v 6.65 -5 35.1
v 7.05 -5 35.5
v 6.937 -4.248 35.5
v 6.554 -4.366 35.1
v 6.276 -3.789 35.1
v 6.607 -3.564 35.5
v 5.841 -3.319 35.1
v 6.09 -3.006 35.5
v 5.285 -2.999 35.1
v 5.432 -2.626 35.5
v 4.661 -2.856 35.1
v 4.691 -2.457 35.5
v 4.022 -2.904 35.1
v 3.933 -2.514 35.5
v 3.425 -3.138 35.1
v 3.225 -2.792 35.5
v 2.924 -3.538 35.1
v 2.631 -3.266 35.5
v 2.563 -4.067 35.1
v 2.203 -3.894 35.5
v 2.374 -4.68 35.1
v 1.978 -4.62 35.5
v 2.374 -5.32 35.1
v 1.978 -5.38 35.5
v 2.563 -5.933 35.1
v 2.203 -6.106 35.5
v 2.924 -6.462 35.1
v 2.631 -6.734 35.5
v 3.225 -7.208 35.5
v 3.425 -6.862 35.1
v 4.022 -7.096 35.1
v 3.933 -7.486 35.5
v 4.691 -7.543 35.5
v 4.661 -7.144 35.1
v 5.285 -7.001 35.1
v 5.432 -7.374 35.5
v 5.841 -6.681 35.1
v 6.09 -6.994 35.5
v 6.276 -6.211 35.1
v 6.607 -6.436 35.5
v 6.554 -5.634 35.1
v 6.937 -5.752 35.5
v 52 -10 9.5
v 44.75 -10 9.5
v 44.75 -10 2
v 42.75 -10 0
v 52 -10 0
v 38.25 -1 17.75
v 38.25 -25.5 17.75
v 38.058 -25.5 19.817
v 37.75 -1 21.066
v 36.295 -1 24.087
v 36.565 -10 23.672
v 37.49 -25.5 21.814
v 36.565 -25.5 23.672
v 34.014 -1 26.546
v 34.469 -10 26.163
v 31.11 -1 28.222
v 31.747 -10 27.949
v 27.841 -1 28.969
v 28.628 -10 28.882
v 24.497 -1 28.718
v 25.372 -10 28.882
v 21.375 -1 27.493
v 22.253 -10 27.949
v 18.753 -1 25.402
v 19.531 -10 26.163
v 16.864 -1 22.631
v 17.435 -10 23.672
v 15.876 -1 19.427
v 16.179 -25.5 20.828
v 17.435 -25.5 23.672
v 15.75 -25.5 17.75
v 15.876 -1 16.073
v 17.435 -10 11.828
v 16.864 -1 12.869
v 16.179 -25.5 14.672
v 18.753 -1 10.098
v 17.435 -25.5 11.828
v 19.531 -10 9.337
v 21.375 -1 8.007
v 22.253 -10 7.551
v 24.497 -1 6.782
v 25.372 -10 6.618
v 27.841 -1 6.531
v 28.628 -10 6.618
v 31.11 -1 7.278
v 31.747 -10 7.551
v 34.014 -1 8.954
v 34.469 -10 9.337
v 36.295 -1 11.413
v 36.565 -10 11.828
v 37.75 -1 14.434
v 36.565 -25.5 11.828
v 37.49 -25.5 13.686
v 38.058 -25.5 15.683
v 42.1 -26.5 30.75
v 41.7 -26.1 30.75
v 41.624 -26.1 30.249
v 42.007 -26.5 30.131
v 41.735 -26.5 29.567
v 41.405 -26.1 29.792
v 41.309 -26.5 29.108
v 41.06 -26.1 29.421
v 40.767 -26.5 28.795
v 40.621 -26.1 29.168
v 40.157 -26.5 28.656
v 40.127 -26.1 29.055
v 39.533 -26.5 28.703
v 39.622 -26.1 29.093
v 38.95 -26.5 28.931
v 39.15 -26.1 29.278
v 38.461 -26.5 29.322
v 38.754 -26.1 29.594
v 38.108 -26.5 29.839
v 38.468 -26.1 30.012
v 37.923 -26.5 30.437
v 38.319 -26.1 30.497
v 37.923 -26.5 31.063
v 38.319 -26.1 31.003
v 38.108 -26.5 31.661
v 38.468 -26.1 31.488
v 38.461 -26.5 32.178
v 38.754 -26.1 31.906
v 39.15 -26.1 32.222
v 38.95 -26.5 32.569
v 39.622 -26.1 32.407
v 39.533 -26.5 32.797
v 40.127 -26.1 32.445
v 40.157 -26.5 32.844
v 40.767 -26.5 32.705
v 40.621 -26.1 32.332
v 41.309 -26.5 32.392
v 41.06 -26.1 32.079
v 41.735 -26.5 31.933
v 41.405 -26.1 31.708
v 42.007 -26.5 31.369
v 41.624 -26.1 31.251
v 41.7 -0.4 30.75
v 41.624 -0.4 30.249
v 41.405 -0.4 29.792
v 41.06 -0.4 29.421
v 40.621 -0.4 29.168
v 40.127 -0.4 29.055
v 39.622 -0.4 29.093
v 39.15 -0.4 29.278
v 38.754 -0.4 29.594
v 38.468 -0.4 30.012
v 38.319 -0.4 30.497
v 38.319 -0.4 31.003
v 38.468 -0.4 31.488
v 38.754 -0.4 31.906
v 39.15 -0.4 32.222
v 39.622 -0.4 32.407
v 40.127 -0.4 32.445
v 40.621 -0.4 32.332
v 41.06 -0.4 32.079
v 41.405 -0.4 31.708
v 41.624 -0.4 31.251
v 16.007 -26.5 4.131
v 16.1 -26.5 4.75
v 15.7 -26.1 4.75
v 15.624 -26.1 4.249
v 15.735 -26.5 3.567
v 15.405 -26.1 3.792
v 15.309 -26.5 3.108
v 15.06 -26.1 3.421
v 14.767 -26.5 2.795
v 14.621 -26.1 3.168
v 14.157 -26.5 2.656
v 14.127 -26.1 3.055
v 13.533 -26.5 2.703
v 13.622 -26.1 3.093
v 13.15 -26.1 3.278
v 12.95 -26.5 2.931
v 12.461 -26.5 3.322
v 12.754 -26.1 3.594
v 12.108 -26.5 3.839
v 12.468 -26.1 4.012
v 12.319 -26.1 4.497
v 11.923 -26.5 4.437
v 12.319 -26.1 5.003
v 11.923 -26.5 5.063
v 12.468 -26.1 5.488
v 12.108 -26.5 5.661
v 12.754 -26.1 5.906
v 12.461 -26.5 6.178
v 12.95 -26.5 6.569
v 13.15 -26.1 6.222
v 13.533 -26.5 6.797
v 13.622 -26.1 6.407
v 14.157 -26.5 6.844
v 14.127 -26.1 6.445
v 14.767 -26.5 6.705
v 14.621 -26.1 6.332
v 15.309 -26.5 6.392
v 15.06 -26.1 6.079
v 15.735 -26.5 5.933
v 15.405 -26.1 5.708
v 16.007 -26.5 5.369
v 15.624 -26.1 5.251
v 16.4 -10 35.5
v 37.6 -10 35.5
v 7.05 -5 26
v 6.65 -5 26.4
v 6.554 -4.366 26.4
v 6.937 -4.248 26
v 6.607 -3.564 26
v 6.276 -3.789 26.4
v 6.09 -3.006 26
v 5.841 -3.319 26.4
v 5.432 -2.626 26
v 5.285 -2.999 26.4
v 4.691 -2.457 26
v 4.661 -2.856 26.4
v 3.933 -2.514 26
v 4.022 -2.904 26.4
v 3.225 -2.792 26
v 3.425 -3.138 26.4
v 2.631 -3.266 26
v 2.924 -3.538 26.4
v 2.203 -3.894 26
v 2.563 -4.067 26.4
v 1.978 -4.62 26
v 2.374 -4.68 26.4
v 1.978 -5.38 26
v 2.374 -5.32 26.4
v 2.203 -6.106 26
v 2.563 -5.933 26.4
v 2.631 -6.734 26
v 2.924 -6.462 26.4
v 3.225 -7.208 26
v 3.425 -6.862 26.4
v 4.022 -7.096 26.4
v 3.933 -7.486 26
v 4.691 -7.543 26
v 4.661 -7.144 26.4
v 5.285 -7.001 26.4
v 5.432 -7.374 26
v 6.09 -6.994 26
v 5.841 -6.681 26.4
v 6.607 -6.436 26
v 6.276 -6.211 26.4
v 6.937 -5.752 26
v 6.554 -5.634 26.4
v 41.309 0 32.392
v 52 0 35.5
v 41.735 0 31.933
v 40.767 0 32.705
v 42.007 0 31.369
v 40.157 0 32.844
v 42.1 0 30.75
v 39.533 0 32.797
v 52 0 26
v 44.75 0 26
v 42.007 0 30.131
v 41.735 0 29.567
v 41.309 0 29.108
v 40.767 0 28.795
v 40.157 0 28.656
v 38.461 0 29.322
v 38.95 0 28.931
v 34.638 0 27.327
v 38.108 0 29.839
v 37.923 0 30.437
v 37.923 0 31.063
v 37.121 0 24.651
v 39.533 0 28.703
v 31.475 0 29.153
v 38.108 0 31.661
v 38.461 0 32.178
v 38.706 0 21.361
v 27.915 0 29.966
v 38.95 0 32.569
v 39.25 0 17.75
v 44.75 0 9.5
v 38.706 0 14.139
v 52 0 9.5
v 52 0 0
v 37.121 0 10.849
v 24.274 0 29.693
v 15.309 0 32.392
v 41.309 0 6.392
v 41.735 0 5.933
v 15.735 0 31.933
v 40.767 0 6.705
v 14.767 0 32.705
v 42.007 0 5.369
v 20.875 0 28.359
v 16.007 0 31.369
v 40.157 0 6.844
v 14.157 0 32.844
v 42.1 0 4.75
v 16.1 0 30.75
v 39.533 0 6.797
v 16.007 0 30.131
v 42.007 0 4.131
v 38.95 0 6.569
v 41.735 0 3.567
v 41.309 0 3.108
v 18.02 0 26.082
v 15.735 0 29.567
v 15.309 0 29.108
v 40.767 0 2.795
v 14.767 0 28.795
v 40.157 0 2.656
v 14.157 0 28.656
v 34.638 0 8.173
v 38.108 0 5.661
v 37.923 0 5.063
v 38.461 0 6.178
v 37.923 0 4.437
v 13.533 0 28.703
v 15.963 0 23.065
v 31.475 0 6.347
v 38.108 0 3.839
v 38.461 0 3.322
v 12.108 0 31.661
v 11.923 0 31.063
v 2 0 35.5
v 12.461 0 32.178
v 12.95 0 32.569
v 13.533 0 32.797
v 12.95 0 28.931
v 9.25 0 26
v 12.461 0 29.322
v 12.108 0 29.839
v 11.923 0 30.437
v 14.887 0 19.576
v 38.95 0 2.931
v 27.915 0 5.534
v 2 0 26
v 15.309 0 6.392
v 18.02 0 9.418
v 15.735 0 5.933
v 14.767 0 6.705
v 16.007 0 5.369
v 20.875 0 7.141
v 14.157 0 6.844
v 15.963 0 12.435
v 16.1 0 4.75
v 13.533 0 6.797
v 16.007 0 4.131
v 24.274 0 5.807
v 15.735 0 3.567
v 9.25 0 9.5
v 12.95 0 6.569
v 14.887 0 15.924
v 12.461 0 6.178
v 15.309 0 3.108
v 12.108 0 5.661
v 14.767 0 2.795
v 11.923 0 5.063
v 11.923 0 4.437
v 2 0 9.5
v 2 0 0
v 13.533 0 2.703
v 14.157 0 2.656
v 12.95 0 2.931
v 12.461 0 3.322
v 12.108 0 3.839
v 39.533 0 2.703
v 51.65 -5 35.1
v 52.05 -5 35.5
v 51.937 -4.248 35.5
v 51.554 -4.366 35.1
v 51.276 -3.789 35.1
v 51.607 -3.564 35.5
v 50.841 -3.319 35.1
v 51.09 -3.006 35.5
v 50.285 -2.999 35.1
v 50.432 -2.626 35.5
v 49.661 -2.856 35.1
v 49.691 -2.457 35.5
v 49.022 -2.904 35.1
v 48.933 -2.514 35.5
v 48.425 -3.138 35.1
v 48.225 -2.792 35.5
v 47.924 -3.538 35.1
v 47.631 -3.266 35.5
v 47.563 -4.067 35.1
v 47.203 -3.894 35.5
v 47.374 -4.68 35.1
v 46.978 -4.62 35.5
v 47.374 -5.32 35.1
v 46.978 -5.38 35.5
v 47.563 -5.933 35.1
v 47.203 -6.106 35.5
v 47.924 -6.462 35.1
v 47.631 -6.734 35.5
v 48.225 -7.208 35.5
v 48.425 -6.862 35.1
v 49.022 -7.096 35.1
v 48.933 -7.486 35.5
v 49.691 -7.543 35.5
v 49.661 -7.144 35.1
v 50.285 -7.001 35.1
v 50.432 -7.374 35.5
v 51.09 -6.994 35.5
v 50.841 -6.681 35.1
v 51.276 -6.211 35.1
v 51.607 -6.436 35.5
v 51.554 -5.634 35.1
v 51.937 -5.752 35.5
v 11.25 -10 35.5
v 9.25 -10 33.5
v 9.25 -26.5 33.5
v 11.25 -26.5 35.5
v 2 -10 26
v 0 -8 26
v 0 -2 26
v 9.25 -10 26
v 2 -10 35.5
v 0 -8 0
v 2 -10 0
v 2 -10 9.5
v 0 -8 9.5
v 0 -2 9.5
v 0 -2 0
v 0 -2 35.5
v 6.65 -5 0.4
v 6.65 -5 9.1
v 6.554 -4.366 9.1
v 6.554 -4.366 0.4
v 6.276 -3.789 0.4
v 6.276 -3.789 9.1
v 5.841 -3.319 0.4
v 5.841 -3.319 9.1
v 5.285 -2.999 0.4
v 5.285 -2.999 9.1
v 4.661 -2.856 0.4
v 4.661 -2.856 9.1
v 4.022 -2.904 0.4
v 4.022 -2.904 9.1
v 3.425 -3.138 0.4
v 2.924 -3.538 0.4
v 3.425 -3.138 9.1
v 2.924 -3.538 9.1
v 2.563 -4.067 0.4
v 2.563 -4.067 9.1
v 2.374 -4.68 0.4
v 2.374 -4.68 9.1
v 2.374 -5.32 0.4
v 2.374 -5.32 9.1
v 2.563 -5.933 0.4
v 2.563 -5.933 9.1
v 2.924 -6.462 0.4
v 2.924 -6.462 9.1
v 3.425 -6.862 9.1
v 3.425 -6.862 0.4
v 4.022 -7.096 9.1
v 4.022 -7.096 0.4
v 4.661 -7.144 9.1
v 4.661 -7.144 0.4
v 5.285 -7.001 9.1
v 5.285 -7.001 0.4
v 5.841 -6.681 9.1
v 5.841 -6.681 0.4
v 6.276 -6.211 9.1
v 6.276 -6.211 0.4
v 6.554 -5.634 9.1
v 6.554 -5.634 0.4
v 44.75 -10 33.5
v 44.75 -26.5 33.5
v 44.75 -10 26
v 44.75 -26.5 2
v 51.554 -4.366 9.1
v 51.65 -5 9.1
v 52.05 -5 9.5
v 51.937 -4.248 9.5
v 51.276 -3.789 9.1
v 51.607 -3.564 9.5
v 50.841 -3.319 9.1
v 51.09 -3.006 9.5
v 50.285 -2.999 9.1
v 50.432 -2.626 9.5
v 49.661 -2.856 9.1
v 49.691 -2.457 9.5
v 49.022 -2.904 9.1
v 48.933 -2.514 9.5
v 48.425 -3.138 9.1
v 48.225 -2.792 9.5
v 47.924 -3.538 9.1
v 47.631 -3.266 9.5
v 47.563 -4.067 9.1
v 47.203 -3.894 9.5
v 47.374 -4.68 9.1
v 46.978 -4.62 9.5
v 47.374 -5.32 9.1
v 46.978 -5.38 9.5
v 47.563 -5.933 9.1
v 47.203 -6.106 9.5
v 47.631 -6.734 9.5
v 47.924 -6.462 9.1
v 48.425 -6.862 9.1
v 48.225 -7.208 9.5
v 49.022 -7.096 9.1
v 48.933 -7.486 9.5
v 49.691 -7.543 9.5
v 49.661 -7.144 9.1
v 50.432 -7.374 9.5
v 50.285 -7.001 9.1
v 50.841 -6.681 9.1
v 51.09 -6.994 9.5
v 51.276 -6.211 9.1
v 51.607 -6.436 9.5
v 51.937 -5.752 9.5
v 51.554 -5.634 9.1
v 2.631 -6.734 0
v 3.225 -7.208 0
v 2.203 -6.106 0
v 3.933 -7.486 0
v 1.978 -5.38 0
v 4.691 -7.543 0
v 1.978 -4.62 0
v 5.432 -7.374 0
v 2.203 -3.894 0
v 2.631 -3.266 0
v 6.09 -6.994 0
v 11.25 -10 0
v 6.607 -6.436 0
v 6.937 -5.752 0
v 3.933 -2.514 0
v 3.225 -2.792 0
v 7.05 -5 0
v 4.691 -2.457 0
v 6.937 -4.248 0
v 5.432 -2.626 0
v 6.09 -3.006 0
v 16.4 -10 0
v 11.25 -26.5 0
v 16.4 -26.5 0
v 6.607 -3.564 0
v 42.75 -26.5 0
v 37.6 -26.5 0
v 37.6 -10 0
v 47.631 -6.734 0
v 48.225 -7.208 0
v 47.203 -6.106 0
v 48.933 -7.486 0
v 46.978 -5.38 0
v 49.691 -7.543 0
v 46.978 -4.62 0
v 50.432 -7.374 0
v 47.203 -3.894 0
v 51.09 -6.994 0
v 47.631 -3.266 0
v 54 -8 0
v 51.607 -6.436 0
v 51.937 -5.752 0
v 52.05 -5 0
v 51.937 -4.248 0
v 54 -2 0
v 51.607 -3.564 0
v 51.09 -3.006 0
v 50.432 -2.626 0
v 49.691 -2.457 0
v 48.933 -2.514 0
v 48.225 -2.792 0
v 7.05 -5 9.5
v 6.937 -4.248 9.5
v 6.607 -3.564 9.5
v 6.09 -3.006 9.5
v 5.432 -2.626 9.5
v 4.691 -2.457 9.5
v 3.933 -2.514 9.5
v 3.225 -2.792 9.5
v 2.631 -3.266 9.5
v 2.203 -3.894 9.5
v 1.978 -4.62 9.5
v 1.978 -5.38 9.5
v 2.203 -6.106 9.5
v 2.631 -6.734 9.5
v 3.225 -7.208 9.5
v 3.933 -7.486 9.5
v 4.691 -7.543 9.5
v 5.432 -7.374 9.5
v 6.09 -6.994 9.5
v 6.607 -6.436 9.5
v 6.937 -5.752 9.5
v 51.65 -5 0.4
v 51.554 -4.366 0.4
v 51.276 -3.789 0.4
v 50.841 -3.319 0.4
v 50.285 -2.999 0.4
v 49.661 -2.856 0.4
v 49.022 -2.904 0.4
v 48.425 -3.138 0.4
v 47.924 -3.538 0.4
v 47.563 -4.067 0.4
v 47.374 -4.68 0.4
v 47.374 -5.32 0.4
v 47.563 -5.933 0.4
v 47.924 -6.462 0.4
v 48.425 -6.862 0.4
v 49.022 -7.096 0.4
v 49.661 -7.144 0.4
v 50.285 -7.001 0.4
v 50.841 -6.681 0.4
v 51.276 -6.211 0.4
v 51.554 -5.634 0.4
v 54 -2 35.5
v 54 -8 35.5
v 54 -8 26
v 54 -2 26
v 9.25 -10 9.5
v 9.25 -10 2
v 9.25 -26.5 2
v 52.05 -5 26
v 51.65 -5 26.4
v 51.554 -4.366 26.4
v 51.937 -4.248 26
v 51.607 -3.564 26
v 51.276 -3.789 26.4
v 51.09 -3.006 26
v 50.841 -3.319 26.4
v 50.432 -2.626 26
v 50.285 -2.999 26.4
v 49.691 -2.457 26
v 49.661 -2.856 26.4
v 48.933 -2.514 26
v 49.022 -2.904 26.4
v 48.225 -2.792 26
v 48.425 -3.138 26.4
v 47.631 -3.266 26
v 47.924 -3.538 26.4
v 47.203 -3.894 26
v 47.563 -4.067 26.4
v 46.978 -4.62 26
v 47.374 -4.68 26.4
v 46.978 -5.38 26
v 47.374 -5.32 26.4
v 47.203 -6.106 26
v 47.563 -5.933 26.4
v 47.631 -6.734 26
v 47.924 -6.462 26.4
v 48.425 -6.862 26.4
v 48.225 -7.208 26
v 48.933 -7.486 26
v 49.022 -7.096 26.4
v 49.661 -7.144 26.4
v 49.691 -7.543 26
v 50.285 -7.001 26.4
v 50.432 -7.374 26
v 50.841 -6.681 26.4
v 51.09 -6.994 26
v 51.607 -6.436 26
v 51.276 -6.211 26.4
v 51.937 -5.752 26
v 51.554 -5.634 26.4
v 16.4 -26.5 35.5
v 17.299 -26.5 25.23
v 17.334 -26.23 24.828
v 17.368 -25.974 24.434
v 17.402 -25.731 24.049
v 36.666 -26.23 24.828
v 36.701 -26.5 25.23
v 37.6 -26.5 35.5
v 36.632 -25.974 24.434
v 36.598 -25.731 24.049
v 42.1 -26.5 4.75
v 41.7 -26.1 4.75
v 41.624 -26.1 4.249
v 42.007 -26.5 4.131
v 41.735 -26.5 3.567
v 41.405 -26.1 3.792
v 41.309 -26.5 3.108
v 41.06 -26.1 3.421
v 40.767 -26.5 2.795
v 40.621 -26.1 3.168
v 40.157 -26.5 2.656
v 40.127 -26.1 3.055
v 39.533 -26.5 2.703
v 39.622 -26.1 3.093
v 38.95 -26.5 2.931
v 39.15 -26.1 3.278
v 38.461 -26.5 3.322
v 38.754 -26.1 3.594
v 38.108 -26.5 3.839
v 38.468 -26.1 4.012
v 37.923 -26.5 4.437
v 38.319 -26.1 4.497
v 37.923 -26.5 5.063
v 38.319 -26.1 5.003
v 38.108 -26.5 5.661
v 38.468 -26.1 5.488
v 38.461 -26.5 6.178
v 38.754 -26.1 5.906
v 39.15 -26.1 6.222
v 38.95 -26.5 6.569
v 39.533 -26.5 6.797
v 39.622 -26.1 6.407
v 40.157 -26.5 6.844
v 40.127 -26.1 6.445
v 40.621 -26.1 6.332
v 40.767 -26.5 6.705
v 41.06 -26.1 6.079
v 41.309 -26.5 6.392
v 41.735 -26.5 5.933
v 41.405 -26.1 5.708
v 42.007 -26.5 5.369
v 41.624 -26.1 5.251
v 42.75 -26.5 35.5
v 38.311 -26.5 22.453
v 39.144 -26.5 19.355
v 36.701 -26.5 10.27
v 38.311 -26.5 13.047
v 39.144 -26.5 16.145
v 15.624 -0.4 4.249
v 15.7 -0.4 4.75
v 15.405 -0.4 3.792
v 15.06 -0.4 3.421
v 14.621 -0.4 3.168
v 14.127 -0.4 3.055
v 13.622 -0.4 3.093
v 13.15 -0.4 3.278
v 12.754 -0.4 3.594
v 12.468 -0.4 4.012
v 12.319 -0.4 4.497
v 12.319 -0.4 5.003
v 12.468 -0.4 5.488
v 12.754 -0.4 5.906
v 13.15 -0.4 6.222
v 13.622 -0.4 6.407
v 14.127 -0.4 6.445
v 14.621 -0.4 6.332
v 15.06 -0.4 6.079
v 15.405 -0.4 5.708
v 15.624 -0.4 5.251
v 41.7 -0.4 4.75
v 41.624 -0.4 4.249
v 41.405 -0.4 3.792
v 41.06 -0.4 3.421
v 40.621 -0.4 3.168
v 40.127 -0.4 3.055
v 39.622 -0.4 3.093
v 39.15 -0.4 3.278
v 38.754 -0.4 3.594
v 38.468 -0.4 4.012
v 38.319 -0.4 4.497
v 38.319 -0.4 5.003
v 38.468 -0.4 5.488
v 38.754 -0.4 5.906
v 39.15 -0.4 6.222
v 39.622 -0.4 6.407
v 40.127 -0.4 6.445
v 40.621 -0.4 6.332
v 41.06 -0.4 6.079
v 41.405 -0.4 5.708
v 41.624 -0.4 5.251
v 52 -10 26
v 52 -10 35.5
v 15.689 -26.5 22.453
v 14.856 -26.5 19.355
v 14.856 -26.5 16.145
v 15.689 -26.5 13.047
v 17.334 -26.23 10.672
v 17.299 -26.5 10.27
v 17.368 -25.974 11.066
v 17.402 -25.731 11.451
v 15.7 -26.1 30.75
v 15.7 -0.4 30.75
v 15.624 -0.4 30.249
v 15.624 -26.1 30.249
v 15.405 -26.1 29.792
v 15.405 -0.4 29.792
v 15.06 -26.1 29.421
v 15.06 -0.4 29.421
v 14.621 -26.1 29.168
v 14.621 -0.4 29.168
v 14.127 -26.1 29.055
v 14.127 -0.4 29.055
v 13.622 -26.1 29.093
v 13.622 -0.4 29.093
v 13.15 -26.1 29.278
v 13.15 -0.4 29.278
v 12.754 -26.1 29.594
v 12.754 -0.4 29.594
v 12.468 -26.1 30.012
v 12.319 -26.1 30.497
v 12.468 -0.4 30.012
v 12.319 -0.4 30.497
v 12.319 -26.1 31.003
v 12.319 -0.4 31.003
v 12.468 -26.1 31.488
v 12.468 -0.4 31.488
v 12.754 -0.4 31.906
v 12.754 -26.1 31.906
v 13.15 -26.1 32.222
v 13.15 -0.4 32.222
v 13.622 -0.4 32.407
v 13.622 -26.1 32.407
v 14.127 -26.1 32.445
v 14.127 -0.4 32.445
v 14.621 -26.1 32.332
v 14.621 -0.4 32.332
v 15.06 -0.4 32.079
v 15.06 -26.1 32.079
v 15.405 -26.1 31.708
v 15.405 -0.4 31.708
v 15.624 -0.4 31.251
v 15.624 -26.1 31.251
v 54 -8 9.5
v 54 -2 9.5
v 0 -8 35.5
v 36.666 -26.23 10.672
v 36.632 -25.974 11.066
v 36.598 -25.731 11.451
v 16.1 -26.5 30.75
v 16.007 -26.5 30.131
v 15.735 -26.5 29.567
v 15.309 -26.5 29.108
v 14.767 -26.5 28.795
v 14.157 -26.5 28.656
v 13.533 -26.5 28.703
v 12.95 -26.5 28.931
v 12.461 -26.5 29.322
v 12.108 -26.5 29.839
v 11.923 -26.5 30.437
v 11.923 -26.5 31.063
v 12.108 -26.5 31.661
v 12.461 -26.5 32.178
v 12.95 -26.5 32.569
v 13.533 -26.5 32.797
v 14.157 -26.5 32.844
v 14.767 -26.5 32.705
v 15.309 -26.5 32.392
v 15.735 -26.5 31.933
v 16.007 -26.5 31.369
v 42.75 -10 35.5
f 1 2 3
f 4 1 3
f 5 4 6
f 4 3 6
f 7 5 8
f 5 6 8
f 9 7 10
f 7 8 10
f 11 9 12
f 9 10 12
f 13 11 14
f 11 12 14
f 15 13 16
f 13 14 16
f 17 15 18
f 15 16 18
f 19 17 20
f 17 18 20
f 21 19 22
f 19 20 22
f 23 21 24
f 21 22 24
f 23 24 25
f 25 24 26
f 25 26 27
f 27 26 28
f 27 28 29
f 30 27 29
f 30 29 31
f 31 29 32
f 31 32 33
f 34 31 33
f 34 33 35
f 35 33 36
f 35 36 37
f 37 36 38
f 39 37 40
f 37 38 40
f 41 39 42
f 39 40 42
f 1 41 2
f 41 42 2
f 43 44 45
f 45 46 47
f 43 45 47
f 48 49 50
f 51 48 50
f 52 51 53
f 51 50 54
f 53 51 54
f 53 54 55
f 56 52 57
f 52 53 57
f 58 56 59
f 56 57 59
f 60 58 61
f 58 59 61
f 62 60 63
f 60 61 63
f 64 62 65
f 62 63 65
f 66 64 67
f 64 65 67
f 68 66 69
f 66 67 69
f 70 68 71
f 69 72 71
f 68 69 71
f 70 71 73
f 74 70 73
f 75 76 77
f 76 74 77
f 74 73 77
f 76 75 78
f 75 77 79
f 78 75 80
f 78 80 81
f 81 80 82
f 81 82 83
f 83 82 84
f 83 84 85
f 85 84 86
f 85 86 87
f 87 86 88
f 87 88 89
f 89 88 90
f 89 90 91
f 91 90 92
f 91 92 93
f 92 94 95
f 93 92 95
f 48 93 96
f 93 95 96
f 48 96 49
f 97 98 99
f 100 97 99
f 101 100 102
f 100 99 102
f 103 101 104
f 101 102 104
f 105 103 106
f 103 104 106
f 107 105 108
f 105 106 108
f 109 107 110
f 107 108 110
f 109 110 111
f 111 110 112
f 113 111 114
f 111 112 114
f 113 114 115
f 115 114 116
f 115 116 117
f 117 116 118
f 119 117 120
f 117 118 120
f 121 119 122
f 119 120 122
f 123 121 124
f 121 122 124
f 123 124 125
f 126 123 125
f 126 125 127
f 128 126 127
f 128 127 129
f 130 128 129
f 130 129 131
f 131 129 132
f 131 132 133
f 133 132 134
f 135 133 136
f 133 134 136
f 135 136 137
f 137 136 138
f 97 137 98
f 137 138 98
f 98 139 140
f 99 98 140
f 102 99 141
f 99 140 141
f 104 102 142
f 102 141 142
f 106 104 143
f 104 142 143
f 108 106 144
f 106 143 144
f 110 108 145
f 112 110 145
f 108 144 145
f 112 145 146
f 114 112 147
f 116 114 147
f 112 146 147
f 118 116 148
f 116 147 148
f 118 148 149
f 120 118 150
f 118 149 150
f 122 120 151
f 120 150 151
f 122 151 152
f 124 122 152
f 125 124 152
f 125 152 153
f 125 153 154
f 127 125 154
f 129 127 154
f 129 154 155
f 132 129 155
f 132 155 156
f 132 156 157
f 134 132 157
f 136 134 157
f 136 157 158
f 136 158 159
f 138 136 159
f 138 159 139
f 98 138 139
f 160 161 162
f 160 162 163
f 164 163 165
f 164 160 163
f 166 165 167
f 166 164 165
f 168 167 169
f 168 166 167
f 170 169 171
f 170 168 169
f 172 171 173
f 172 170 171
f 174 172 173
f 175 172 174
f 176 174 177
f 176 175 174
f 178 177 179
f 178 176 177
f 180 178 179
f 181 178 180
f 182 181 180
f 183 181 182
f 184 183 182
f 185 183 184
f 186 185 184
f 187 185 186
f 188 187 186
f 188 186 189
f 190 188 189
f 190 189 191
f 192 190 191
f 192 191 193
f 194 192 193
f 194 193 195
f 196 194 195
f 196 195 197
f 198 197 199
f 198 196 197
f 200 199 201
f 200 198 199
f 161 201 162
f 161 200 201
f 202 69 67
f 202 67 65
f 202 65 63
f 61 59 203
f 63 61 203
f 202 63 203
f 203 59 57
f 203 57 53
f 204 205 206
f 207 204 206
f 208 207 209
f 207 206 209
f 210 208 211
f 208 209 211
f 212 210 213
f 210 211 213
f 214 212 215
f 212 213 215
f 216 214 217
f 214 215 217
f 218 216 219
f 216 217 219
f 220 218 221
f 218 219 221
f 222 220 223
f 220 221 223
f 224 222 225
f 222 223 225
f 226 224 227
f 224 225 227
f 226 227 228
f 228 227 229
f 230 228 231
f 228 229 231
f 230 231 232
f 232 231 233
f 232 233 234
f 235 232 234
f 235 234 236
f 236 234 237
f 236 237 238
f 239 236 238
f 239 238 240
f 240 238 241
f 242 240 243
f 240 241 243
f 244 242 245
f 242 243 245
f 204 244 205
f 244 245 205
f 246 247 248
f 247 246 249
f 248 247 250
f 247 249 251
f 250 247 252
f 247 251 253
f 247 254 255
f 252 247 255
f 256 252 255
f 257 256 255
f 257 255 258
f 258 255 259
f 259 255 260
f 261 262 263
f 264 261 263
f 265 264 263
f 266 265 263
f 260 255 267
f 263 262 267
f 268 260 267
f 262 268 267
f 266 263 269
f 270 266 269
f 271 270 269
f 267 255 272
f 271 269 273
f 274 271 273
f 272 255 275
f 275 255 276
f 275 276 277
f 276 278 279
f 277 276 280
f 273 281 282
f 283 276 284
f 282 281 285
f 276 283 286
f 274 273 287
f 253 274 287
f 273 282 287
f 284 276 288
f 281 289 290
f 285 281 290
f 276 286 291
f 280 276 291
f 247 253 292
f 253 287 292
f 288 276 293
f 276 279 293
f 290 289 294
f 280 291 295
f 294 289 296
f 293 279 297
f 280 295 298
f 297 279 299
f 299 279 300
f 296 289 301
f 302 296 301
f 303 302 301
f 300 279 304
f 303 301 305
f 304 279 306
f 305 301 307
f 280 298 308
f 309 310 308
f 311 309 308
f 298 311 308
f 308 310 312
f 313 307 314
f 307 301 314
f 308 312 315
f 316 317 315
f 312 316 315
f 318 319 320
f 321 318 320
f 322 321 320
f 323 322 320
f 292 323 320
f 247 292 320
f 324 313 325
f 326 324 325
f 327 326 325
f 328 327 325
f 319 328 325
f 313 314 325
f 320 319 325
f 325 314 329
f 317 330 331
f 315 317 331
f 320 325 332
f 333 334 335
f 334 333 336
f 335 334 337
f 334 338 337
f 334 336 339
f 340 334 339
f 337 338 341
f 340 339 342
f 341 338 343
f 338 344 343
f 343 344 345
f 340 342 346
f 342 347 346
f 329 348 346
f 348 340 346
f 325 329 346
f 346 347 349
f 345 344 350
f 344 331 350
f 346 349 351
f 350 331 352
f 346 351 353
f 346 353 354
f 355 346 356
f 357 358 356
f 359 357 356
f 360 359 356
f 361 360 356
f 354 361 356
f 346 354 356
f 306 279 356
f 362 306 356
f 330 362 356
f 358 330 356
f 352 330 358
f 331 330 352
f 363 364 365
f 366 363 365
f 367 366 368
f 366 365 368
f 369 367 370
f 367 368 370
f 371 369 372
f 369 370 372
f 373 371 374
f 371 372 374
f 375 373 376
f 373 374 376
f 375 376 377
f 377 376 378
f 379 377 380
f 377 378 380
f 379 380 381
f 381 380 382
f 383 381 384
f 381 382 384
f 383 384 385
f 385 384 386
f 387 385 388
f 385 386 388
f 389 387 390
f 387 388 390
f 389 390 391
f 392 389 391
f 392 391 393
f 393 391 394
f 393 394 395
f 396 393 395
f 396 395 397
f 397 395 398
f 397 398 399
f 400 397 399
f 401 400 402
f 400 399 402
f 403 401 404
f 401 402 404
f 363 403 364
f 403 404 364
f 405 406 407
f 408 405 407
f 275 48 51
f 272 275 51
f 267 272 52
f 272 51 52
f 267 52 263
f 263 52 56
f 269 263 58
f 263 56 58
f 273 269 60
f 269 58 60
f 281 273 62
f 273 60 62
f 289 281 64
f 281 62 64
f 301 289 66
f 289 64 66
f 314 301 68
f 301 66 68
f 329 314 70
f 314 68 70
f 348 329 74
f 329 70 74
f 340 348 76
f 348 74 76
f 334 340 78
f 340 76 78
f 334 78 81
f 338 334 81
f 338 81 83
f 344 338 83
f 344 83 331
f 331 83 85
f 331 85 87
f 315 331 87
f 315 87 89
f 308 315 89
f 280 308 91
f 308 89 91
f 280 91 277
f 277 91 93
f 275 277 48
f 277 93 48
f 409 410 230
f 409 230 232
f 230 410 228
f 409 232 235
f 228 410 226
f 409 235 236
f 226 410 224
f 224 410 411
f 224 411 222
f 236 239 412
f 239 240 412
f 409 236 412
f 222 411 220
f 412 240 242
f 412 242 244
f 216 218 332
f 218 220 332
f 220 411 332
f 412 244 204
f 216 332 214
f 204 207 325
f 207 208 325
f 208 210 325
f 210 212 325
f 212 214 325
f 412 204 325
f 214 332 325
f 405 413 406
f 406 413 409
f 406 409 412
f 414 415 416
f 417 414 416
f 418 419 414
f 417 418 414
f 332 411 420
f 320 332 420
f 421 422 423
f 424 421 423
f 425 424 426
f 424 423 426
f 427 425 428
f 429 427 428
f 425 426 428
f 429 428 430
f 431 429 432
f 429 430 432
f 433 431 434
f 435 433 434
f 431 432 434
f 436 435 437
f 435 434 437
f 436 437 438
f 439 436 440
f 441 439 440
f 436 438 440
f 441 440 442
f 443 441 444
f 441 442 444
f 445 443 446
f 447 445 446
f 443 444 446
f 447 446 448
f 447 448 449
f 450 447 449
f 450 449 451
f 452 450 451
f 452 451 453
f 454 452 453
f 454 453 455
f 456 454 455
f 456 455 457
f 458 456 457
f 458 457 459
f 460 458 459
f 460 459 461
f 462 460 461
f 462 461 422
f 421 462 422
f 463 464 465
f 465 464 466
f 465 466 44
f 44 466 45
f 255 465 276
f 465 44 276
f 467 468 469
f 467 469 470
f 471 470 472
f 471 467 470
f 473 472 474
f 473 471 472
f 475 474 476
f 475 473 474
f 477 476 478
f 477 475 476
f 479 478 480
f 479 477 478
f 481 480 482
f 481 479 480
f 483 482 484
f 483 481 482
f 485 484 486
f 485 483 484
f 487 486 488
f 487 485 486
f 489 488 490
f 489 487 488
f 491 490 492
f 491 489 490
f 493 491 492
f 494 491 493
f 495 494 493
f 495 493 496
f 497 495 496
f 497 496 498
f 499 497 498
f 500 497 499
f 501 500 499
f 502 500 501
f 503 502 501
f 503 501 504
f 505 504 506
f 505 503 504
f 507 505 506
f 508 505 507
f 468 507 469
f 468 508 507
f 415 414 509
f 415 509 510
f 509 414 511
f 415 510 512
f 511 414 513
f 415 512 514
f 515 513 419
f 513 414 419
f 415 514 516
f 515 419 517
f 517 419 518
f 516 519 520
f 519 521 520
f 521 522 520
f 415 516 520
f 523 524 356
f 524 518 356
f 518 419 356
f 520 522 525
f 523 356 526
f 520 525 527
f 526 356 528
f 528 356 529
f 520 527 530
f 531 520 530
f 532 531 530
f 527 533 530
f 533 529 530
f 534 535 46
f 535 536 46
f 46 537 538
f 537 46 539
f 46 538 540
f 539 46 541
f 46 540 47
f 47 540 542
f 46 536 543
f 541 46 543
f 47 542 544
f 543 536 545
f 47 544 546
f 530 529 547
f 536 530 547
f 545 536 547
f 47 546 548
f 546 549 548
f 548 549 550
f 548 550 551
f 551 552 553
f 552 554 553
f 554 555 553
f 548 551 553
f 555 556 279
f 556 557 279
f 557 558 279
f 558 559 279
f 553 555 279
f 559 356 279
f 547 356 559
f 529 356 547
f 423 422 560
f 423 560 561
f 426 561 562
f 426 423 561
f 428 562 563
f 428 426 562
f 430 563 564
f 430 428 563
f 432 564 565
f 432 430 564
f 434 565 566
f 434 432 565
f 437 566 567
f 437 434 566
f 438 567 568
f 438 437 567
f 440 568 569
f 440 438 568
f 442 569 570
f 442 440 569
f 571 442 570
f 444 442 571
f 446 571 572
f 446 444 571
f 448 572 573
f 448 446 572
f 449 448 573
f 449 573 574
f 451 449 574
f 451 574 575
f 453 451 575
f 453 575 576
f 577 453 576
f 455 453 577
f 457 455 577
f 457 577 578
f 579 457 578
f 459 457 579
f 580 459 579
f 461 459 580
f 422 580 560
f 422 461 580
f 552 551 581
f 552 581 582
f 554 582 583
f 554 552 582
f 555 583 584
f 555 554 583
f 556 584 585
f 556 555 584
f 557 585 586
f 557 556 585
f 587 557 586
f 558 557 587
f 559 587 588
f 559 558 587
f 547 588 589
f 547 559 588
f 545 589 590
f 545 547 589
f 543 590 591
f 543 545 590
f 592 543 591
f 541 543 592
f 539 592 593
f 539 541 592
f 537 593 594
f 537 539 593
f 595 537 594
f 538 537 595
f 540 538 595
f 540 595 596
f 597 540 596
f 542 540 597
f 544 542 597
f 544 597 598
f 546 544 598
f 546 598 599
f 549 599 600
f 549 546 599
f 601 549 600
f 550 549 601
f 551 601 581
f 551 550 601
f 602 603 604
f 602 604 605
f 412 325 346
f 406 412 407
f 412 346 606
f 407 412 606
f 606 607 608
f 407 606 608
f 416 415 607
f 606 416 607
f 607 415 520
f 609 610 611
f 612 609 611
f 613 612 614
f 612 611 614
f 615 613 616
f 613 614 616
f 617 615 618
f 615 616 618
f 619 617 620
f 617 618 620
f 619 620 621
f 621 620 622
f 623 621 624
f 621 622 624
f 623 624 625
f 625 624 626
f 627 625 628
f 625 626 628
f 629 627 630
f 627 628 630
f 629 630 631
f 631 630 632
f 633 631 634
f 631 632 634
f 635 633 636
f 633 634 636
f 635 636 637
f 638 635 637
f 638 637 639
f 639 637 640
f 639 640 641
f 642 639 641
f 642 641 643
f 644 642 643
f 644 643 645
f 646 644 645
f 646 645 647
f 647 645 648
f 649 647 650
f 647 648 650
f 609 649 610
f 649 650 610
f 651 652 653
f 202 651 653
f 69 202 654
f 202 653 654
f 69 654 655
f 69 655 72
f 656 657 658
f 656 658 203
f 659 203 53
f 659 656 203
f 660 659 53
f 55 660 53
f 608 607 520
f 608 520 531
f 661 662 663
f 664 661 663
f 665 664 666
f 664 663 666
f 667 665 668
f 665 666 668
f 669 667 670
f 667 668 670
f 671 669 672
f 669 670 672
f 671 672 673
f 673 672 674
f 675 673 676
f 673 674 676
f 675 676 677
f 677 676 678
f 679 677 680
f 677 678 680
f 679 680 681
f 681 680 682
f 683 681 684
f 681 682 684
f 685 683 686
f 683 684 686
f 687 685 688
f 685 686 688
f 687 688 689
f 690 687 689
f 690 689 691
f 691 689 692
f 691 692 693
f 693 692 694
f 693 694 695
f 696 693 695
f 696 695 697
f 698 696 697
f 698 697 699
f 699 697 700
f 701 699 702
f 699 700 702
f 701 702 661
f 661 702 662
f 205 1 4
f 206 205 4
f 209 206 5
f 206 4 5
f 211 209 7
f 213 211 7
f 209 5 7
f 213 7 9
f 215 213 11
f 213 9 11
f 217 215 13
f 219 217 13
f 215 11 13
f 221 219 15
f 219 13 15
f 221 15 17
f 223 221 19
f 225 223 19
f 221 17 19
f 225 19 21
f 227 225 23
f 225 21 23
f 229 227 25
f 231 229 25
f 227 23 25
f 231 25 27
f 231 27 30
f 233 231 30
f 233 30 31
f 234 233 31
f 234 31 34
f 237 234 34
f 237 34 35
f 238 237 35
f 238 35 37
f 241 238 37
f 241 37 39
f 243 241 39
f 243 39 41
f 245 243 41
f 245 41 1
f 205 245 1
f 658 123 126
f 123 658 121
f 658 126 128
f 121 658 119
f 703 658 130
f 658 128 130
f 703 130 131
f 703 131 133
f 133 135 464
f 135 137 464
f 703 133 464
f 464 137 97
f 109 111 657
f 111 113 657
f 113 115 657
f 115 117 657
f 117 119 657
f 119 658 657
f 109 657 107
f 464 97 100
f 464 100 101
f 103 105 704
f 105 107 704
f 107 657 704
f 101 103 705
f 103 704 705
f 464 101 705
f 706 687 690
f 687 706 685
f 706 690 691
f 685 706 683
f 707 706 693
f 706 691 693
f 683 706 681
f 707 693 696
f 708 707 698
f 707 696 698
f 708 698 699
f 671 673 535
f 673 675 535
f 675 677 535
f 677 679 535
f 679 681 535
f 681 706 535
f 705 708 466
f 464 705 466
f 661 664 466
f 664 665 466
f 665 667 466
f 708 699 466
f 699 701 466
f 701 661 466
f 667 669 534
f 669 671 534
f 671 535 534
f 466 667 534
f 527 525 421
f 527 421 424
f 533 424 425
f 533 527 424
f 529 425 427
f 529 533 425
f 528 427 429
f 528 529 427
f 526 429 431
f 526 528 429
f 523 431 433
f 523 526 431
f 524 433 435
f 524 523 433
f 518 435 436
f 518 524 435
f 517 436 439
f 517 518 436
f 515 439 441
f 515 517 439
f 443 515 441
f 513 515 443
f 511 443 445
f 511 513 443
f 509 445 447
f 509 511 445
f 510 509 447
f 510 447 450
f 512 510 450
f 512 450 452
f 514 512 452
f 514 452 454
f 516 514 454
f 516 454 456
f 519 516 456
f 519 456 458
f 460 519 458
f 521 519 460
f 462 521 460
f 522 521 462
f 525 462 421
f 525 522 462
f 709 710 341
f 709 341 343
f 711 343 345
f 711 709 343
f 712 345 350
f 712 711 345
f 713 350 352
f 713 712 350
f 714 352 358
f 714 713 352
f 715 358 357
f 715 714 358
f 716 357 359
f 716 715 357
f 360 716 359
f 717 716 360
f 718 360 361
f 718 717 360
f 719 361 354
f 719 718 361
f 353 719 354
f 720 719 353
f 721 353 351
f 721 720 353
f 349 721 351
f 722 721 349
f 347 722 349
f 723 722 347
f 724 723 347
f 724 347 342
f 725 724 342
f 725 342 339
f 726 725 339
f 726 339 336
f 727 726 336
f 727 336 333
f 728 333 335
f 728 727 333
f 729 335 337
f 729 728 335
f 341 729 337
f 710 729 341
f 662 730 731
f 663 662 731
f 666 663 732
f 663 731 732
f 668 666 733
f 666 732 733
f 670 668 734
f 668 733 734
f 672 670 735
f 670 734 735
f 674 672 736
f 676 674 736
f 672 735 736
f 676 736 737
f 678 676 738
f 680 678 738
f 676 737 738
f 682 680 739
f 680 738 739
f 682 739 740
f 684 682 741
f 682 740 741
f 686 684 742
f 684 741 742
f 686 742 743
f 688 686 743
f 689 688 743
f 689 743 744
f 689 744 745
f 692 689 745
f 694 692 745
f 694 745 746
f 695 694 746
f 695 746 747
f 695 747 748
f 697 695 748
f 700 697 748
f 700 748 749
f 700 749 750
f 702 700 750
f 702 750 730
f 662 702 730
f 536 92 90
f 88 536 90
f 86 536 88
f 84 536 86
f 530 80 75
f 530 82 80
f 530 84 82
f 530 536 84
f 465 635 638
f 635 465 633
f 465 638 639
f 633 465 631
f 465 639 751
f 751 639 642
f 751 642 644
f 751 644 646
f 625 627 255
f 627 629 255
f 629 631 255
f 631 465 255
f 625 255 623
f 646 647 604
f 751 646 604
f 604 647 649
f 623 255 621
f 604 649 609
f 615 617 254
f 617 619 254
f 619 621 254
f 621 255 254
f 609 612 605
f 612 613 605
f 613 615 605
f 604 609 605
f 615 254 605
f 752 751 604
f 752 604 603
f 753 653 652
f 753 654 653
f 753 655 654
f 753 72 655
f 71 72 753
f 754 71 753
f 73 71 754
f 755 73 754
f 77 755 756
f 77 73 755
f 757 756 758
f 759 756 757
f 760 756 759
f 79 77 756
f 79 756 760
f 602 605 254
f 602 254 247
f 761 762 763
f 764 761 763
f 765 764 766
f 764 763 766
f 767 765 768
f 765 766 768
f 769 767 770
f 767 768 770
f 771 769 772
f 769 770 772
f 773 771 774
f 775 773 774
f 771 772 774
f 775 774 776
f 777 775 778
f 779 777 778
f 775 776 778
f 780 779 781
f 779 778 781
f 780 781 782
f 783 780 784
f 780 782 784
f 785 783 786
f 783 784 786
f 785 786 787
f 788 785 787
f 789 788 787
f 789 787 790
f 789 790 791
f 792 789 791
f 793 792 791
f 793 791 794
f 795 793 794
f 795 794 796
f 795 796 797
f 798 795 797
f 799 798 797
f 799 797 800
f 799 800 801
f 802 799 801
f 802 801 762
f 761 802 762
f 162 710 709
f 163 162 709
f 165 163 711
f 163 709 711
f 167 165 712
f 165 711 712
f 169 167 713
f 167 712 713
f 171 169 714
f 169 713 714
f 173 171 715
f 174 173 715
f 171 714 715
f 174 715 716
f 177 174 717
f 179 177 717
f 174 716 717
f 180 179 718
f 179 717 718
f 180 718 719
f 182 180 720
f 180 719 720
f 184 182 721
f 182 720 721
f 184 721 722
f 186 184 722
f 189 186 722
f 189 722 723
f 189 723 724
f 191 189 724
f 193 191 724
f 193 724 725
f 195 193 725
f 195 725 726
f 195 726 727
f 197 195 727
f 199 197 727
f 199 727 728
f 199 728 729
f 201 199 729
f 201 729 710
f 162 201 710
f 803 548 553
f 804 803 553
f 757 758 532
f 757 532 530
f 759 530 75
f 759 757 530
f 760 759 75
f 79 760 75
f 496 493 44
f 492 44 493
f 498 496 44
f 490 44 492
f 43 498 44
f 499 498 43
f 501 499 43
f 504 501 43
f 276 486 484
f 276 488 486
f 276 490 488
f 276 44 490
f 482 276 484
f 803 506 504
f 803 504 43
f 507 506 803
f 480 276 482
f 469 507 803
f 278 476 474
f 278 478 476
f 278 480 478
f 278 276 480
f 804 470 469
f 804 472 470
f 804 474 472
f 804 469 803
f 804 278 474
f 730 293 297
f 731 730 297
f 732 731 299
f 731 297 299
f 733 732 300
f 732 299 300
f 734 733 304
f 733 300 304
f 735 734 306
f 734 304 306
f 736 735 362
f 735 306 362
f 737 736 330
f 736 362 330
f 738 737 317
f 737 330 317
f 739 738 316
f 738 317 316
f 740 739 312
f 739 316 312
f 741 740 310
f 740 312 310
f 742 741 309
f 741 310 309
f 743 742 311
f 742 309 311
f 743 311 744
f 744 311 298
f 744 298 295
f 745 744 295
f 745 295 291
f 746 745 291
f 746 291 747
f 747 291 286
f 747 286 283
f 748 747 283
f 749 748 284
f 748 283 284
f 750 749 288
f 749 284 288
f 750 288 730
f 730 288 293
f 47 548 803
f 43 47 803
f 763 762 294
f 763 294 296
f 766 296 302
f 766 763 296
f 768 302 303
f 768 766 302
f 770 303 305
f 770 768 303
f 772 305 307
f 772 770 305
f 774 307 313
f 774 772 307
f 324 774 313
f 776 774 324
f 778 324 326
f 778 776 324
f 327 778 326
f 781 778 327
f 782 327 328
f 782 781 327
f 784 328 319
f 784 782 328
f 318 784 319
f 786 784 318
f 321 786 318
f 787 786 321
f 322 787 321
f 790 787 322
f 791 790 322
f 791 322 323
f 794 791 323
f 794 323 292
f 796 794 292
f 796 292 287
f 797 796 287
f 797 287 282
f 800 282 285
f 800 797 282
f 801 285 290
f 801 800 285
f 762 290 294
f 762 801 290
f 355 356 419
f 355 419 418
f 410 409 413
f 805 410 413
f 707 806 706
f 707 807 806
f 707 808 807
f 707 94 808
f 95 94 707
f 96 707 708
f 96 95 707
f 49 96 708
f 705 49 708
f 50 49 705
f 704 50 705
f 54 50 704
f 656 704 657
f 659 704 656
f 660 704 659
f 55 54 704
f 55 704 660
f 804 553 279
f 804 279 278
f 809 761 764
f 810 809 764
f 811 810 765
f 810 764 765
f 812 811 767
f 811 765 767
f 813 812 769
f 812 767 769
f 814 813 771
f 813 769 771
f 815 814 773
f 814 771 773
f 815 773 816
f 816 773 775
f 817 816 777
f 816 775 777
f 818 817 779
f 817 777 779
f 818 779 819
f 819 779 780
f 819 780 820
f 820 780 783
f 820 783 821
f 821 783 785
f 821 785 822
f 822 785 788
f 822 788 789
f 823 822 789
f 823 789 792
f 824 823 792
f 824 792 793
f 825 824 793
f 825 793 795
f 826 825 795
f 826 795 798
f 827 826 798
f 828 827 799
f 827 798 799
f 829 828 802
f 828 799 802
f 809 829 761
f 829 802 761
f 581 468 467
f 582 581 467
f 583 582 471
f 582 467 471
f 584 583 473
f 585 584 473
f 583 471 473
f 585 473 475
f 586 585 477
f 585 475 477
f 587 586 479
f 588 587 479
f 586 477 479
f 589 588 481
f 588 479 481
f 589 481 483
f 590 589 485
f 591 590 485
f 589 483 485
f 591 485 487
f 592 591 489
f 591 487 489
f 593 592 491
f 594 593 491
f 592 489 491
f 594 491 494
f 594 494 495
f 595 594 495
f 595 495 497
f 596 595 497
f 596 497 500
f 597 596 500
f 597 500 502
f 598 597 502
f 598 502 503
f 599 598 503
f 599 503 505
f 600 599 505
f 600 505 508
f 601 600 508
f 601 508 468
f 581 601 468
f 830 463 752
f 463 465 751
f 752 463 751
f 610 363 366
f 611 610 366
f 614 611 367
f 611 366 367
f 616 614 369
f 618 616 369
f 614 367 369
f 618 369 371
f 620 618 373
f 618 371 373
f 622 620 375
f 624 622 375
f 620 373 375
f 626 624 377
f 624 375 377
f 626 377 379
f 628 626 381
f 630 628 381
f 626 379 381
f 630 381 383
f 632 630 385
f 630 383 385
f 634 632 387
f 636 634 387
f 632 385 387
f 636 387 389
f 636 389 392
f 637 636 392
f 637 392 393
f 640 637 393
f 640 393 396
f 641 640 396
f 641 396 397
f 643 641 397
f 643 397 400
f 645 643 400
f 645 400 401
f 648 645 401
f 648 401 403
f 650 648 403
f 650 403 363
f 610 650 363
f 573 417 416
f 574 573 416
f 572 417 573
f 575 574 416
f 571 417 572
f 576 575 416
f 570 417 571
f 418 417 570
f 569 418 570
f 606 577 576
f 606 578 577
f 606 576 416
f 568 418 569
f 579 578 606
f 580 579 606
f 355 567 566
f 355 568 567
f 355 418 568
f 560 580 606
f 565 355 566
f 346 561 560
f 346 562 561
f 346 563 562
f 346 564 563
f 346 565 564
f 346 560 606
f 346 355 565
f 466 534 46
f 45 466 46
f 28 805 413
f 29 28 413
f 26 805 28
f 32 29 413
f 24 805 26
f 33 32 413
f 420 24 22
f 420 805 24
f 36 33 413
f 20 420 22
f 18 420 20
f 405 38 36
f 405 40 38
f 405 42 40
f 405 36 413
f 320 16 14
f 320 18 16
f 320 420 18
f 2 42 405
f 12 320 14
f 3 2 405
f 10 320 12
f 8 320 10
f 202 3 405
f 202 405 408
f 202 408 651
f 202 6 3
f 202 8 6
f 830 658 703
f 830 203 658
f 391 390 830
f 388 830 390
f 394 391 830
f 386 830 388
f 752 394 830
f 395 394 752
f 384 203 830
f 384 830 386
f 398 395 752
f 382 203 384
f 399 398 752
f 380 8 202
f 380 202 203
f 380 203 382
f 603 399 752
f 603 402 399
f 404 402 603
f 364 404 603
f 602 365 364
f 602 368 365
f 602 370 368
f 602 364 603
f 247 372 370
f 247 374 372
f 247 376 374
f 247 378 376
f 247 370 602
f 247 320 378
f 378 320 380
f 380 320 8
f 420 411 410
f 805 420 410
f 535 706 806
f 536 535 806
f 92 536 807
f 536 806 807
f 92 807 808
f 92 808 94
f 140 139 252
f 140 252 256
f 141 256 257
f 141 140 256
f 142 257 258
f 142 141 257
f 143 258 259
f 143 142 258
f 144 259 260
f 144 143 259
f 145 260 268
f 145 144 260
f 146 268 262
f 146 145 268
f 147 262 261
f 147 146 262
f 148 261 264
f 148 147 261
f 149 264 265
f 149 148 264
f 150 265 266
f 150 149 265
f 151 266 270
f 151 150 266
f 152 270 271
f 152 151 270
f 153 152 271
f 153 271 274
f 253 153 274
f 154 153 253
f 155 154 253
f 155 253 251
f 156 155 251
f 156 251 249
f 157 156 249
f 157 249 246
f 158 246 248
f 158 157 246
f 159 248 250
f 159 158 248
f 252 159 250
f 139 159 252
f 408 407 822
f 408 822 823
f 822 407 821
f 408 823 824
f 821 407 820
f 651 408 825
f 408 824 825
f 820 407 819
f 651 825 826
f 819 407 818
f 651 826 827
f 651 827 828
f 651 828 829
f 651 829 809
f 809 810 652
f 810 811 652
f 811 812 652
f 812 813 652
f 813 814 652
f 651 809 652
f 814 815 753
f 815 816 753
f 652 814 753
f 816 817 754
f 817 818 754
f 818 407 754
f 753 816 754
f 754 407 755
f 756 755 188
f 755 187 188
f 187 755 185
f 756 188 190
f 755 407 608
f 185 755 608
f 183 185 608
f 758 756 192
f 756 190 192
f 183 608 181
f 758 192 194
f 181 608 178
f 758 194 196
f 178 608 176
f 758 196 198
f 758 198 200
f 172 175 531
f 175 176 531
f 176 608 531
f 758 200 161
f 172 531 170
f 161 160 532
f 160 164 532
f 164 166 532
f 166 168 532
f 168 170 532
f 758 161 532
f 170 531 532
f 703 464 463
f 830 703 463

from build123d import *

# Parameters (mm, degrees)
BOSS_EXTRUDE1_DEPTH  = 35.5
SKETCH2_R            = 2.15
CUT_EXTRUDE1_DEPTH   = 35.5
SKETCH3_R            = 11.25
CUT_EXTRUDE2_DEPTH   = 35.5
M3_CLEARANCE_HOLE1_D = 3.4
SKETCH8_W            = 19
SKETCH8_H            = 35.5
CUT_EXTRUDE3_DEPTH   = 16.5
CHAMFER1_SIZE        = 1.1
CHAMFER1_SIZE_2      = 12.573057533
SKETCH9_W            = 9.25
SKETCH9_H            = 16.5
CUT_EXTRUDE4_DEPTH   = 10
CHAMFER4_SIZE        = 2
CHAMFER6_SIZE        = 1
CHAMFER7_SIZE        = 0.4
CHAMFER8_SIZE        = 2


with BuildPart() as part:
    # Sketch1 → Boss-Extrude1 (new body)
    with BuildSketch(Plane.XY):
        Polygon((0, 0), (0, -10), (9.25, -10), (9.25, -26.5), (44.75, -26.5), (44.75, -10), (54, -10), (54, 0), align=None)
    extrude(amount=BOSS_EXTRUDE1_DEPTH)

    # Sketch2 → Cut-Extrude1 (cut)
    with BuildSketch(Plane.XY.offset(35.5)):
        with Locations((4.5, -5)):
            Circle(SKETCH2_R)
        with Locations((49.5, -5)):
            Circle(SKETCH2_R)
    extrude(amount=-CUT_EXTRUDE1_DEPTH, mode=Mode.SUBTRACT)

    # Sketch3 → Cut-Extrude2 (cut)
    with BuildSketch(Plane.XZ.offset(26.5)):
        with Locations((27, 17.75)):
            Circle(SKETCH3_R)
    extrude(amount=-CUT_EXTRUDE2_DEPTH, mode=Mode.SUBTRACT)

    # M3 Clearance Hole1 (through all)
    with Locations(Plane(origin=(0, -26.5, 0), x_dir=(-1, 0, 0), z_dir=(0, -1, 0))):
        with Locations((-14, -30.75), (-40, -30.75), (-40, -4.75), (-14, -4.75)):
            Hole(M3_CLEARANCE_HOLE1_D / 2)

    # Sketch8 → Cut-Extrude3 (cut)
    with BuildSketch(Plane.XZ.offset(26.5)):
        with Locations((27, 17.75)):
            Rectangle(SKETCH8_W, SKETCH8_H)
    extrude(amount=-CUT_EXTRUDE3_DEPTH, mode=Mode.SUBTRACT)

    # Chamfer1
    # the kernel refuses this chamfer: 12.573057533, 1.1 mm, written as the material it takes off along each edge
    with BuildSketch(Plane(origin=(36.5, -59.185348851, 0), x_dir=(0.9159861691531063, 0, -0.40120984275091887), z_dir=(0, 1, 0)), Plane(origin=(17.5, -59.185348851, 35.5), x_dir=(-0.9159861691531072, 0, 0.40120984275091703), z_dir=(0, 1, 0))) as chamfer1_piece_1:
        Polygon((CHAMFER1_SIZE * 0.915986169153, -CHAMFER1_SIZE * 0.401209842751), (-CHAMFER1_SIZE_2 * 0.401209842752, -CHAMFER1_SIZE_2 * 0.915986169156), (0, 0), align=None)
    extrude(amount=49.185348851, mode=Mode.SUBTRACT)
    with BuildSketch(Plane(origin=(17.5, -59.185348851, 0), x_dir=(-0.9159861691531066, 0, -0.4012098427509178), z_dir=(0, 1, 0)), Plane(origin=(36.5, -59.185348851, 35.5), x_dir=(0.9159861691531066, 0, 0.40120984275091803), z_dir=(0, 1, 0))) as chamfer1_piece_2:
        Polygon((CHAMFER1_SIZE * 0.915986169153, CHAMFER1_SIZE * 0.401209842751), (-CHAMFER1_SIZE_2 * 0.401209842752, CHAMFER1_SIZE_2 * 0.915986169156), (0, 0), align=None)
    extrude(amount=49.185348851, mode=Mode.SUBTRACT)

    # Sketch9 → Cut-Extrude4 (cut)
    with BuildSketch(Plane(origin=(0, 0, 0), x_dir=(1, 0, 0), z_dir=(0, 1, 0))):
        with Locations((4.625, -17.75)):
            Rectangle(SKETCH9_W, SKETCH9_H)
        with Locations((49.375, -17.75)):
            Rectangle(SKETCH9_W, SKETCH9_H)
    extrude(amount=-CUT_EXTRUDE4_DEPTH, mode=Mode.SUBTRACT)

    # Chamfer4
    chamfer4_edges = [part.edges().sort_by_distance(p)[0] for p in [
        (54, 0, 30.75),
        (54, -10, 30.75),
        (0, -10, 30.75),
        (0, 0, 30.75),
        (54, 0, 4.75),
        (54, -10, 4.75),
        (0, -10, 4.75),
        (0, 0, 4.75),
    ]]
    chamfer(chamfer4_edges, length=CHAMFER4_SIZE)

    # Chamfer6
    chamfer6_edges = [part.edges().sort_by_distance(p)[0] for p in [
        (15.75, 0, 17.75),
        (37.820600651, -26.5, 14.67150986),
        (15.75, -26.5, 17.75),
    ]]
    chamfer(chamfer6_edges, length=CHAMFER6_SIZE)

    # Chamfer7
    chamfer7_edges = [part.edges().sort_by_distance(p)[0] for p in [
        (2.35, -5, 9.5),
        (2.35, -5, 26),
        (47.35, -5, 26),
        (47.35, -5, 9.5),
        (2.35, -5, 0),
        (2.35, -5, 35.5),
        (47.35, -5, 0),
        (47.35, -5, 35.5),
        (12.3, -26.5, 4.75),
        (12.3, 0, 4.75),
        (38.3, -26.5, 4.75),
        (38.3, 0, 4.75),
        (38.3, -26.5, 30.75),
        (38.3, 0, 30.75),
        (12.3, -26.5, 30.75),
        (12.3, 0, 30.75),
    ]]
    chamfer(chamfer7_edges, length=CHAMFER7_SIZE)

    # Chamfer8
    chamfer8_edges = [part.edges().sort_by_distance(p)[0] for p in [
        (9.25, -18.25, 35.5),
        (44.75, -18.25, 35.5),
        (44.75, -18.25, 0),
        (9.25, -18.25, 0),
    ]]
    chamfer(chamfer8_edges, length=CHAMFER8_SIZE)


solid = part.part
